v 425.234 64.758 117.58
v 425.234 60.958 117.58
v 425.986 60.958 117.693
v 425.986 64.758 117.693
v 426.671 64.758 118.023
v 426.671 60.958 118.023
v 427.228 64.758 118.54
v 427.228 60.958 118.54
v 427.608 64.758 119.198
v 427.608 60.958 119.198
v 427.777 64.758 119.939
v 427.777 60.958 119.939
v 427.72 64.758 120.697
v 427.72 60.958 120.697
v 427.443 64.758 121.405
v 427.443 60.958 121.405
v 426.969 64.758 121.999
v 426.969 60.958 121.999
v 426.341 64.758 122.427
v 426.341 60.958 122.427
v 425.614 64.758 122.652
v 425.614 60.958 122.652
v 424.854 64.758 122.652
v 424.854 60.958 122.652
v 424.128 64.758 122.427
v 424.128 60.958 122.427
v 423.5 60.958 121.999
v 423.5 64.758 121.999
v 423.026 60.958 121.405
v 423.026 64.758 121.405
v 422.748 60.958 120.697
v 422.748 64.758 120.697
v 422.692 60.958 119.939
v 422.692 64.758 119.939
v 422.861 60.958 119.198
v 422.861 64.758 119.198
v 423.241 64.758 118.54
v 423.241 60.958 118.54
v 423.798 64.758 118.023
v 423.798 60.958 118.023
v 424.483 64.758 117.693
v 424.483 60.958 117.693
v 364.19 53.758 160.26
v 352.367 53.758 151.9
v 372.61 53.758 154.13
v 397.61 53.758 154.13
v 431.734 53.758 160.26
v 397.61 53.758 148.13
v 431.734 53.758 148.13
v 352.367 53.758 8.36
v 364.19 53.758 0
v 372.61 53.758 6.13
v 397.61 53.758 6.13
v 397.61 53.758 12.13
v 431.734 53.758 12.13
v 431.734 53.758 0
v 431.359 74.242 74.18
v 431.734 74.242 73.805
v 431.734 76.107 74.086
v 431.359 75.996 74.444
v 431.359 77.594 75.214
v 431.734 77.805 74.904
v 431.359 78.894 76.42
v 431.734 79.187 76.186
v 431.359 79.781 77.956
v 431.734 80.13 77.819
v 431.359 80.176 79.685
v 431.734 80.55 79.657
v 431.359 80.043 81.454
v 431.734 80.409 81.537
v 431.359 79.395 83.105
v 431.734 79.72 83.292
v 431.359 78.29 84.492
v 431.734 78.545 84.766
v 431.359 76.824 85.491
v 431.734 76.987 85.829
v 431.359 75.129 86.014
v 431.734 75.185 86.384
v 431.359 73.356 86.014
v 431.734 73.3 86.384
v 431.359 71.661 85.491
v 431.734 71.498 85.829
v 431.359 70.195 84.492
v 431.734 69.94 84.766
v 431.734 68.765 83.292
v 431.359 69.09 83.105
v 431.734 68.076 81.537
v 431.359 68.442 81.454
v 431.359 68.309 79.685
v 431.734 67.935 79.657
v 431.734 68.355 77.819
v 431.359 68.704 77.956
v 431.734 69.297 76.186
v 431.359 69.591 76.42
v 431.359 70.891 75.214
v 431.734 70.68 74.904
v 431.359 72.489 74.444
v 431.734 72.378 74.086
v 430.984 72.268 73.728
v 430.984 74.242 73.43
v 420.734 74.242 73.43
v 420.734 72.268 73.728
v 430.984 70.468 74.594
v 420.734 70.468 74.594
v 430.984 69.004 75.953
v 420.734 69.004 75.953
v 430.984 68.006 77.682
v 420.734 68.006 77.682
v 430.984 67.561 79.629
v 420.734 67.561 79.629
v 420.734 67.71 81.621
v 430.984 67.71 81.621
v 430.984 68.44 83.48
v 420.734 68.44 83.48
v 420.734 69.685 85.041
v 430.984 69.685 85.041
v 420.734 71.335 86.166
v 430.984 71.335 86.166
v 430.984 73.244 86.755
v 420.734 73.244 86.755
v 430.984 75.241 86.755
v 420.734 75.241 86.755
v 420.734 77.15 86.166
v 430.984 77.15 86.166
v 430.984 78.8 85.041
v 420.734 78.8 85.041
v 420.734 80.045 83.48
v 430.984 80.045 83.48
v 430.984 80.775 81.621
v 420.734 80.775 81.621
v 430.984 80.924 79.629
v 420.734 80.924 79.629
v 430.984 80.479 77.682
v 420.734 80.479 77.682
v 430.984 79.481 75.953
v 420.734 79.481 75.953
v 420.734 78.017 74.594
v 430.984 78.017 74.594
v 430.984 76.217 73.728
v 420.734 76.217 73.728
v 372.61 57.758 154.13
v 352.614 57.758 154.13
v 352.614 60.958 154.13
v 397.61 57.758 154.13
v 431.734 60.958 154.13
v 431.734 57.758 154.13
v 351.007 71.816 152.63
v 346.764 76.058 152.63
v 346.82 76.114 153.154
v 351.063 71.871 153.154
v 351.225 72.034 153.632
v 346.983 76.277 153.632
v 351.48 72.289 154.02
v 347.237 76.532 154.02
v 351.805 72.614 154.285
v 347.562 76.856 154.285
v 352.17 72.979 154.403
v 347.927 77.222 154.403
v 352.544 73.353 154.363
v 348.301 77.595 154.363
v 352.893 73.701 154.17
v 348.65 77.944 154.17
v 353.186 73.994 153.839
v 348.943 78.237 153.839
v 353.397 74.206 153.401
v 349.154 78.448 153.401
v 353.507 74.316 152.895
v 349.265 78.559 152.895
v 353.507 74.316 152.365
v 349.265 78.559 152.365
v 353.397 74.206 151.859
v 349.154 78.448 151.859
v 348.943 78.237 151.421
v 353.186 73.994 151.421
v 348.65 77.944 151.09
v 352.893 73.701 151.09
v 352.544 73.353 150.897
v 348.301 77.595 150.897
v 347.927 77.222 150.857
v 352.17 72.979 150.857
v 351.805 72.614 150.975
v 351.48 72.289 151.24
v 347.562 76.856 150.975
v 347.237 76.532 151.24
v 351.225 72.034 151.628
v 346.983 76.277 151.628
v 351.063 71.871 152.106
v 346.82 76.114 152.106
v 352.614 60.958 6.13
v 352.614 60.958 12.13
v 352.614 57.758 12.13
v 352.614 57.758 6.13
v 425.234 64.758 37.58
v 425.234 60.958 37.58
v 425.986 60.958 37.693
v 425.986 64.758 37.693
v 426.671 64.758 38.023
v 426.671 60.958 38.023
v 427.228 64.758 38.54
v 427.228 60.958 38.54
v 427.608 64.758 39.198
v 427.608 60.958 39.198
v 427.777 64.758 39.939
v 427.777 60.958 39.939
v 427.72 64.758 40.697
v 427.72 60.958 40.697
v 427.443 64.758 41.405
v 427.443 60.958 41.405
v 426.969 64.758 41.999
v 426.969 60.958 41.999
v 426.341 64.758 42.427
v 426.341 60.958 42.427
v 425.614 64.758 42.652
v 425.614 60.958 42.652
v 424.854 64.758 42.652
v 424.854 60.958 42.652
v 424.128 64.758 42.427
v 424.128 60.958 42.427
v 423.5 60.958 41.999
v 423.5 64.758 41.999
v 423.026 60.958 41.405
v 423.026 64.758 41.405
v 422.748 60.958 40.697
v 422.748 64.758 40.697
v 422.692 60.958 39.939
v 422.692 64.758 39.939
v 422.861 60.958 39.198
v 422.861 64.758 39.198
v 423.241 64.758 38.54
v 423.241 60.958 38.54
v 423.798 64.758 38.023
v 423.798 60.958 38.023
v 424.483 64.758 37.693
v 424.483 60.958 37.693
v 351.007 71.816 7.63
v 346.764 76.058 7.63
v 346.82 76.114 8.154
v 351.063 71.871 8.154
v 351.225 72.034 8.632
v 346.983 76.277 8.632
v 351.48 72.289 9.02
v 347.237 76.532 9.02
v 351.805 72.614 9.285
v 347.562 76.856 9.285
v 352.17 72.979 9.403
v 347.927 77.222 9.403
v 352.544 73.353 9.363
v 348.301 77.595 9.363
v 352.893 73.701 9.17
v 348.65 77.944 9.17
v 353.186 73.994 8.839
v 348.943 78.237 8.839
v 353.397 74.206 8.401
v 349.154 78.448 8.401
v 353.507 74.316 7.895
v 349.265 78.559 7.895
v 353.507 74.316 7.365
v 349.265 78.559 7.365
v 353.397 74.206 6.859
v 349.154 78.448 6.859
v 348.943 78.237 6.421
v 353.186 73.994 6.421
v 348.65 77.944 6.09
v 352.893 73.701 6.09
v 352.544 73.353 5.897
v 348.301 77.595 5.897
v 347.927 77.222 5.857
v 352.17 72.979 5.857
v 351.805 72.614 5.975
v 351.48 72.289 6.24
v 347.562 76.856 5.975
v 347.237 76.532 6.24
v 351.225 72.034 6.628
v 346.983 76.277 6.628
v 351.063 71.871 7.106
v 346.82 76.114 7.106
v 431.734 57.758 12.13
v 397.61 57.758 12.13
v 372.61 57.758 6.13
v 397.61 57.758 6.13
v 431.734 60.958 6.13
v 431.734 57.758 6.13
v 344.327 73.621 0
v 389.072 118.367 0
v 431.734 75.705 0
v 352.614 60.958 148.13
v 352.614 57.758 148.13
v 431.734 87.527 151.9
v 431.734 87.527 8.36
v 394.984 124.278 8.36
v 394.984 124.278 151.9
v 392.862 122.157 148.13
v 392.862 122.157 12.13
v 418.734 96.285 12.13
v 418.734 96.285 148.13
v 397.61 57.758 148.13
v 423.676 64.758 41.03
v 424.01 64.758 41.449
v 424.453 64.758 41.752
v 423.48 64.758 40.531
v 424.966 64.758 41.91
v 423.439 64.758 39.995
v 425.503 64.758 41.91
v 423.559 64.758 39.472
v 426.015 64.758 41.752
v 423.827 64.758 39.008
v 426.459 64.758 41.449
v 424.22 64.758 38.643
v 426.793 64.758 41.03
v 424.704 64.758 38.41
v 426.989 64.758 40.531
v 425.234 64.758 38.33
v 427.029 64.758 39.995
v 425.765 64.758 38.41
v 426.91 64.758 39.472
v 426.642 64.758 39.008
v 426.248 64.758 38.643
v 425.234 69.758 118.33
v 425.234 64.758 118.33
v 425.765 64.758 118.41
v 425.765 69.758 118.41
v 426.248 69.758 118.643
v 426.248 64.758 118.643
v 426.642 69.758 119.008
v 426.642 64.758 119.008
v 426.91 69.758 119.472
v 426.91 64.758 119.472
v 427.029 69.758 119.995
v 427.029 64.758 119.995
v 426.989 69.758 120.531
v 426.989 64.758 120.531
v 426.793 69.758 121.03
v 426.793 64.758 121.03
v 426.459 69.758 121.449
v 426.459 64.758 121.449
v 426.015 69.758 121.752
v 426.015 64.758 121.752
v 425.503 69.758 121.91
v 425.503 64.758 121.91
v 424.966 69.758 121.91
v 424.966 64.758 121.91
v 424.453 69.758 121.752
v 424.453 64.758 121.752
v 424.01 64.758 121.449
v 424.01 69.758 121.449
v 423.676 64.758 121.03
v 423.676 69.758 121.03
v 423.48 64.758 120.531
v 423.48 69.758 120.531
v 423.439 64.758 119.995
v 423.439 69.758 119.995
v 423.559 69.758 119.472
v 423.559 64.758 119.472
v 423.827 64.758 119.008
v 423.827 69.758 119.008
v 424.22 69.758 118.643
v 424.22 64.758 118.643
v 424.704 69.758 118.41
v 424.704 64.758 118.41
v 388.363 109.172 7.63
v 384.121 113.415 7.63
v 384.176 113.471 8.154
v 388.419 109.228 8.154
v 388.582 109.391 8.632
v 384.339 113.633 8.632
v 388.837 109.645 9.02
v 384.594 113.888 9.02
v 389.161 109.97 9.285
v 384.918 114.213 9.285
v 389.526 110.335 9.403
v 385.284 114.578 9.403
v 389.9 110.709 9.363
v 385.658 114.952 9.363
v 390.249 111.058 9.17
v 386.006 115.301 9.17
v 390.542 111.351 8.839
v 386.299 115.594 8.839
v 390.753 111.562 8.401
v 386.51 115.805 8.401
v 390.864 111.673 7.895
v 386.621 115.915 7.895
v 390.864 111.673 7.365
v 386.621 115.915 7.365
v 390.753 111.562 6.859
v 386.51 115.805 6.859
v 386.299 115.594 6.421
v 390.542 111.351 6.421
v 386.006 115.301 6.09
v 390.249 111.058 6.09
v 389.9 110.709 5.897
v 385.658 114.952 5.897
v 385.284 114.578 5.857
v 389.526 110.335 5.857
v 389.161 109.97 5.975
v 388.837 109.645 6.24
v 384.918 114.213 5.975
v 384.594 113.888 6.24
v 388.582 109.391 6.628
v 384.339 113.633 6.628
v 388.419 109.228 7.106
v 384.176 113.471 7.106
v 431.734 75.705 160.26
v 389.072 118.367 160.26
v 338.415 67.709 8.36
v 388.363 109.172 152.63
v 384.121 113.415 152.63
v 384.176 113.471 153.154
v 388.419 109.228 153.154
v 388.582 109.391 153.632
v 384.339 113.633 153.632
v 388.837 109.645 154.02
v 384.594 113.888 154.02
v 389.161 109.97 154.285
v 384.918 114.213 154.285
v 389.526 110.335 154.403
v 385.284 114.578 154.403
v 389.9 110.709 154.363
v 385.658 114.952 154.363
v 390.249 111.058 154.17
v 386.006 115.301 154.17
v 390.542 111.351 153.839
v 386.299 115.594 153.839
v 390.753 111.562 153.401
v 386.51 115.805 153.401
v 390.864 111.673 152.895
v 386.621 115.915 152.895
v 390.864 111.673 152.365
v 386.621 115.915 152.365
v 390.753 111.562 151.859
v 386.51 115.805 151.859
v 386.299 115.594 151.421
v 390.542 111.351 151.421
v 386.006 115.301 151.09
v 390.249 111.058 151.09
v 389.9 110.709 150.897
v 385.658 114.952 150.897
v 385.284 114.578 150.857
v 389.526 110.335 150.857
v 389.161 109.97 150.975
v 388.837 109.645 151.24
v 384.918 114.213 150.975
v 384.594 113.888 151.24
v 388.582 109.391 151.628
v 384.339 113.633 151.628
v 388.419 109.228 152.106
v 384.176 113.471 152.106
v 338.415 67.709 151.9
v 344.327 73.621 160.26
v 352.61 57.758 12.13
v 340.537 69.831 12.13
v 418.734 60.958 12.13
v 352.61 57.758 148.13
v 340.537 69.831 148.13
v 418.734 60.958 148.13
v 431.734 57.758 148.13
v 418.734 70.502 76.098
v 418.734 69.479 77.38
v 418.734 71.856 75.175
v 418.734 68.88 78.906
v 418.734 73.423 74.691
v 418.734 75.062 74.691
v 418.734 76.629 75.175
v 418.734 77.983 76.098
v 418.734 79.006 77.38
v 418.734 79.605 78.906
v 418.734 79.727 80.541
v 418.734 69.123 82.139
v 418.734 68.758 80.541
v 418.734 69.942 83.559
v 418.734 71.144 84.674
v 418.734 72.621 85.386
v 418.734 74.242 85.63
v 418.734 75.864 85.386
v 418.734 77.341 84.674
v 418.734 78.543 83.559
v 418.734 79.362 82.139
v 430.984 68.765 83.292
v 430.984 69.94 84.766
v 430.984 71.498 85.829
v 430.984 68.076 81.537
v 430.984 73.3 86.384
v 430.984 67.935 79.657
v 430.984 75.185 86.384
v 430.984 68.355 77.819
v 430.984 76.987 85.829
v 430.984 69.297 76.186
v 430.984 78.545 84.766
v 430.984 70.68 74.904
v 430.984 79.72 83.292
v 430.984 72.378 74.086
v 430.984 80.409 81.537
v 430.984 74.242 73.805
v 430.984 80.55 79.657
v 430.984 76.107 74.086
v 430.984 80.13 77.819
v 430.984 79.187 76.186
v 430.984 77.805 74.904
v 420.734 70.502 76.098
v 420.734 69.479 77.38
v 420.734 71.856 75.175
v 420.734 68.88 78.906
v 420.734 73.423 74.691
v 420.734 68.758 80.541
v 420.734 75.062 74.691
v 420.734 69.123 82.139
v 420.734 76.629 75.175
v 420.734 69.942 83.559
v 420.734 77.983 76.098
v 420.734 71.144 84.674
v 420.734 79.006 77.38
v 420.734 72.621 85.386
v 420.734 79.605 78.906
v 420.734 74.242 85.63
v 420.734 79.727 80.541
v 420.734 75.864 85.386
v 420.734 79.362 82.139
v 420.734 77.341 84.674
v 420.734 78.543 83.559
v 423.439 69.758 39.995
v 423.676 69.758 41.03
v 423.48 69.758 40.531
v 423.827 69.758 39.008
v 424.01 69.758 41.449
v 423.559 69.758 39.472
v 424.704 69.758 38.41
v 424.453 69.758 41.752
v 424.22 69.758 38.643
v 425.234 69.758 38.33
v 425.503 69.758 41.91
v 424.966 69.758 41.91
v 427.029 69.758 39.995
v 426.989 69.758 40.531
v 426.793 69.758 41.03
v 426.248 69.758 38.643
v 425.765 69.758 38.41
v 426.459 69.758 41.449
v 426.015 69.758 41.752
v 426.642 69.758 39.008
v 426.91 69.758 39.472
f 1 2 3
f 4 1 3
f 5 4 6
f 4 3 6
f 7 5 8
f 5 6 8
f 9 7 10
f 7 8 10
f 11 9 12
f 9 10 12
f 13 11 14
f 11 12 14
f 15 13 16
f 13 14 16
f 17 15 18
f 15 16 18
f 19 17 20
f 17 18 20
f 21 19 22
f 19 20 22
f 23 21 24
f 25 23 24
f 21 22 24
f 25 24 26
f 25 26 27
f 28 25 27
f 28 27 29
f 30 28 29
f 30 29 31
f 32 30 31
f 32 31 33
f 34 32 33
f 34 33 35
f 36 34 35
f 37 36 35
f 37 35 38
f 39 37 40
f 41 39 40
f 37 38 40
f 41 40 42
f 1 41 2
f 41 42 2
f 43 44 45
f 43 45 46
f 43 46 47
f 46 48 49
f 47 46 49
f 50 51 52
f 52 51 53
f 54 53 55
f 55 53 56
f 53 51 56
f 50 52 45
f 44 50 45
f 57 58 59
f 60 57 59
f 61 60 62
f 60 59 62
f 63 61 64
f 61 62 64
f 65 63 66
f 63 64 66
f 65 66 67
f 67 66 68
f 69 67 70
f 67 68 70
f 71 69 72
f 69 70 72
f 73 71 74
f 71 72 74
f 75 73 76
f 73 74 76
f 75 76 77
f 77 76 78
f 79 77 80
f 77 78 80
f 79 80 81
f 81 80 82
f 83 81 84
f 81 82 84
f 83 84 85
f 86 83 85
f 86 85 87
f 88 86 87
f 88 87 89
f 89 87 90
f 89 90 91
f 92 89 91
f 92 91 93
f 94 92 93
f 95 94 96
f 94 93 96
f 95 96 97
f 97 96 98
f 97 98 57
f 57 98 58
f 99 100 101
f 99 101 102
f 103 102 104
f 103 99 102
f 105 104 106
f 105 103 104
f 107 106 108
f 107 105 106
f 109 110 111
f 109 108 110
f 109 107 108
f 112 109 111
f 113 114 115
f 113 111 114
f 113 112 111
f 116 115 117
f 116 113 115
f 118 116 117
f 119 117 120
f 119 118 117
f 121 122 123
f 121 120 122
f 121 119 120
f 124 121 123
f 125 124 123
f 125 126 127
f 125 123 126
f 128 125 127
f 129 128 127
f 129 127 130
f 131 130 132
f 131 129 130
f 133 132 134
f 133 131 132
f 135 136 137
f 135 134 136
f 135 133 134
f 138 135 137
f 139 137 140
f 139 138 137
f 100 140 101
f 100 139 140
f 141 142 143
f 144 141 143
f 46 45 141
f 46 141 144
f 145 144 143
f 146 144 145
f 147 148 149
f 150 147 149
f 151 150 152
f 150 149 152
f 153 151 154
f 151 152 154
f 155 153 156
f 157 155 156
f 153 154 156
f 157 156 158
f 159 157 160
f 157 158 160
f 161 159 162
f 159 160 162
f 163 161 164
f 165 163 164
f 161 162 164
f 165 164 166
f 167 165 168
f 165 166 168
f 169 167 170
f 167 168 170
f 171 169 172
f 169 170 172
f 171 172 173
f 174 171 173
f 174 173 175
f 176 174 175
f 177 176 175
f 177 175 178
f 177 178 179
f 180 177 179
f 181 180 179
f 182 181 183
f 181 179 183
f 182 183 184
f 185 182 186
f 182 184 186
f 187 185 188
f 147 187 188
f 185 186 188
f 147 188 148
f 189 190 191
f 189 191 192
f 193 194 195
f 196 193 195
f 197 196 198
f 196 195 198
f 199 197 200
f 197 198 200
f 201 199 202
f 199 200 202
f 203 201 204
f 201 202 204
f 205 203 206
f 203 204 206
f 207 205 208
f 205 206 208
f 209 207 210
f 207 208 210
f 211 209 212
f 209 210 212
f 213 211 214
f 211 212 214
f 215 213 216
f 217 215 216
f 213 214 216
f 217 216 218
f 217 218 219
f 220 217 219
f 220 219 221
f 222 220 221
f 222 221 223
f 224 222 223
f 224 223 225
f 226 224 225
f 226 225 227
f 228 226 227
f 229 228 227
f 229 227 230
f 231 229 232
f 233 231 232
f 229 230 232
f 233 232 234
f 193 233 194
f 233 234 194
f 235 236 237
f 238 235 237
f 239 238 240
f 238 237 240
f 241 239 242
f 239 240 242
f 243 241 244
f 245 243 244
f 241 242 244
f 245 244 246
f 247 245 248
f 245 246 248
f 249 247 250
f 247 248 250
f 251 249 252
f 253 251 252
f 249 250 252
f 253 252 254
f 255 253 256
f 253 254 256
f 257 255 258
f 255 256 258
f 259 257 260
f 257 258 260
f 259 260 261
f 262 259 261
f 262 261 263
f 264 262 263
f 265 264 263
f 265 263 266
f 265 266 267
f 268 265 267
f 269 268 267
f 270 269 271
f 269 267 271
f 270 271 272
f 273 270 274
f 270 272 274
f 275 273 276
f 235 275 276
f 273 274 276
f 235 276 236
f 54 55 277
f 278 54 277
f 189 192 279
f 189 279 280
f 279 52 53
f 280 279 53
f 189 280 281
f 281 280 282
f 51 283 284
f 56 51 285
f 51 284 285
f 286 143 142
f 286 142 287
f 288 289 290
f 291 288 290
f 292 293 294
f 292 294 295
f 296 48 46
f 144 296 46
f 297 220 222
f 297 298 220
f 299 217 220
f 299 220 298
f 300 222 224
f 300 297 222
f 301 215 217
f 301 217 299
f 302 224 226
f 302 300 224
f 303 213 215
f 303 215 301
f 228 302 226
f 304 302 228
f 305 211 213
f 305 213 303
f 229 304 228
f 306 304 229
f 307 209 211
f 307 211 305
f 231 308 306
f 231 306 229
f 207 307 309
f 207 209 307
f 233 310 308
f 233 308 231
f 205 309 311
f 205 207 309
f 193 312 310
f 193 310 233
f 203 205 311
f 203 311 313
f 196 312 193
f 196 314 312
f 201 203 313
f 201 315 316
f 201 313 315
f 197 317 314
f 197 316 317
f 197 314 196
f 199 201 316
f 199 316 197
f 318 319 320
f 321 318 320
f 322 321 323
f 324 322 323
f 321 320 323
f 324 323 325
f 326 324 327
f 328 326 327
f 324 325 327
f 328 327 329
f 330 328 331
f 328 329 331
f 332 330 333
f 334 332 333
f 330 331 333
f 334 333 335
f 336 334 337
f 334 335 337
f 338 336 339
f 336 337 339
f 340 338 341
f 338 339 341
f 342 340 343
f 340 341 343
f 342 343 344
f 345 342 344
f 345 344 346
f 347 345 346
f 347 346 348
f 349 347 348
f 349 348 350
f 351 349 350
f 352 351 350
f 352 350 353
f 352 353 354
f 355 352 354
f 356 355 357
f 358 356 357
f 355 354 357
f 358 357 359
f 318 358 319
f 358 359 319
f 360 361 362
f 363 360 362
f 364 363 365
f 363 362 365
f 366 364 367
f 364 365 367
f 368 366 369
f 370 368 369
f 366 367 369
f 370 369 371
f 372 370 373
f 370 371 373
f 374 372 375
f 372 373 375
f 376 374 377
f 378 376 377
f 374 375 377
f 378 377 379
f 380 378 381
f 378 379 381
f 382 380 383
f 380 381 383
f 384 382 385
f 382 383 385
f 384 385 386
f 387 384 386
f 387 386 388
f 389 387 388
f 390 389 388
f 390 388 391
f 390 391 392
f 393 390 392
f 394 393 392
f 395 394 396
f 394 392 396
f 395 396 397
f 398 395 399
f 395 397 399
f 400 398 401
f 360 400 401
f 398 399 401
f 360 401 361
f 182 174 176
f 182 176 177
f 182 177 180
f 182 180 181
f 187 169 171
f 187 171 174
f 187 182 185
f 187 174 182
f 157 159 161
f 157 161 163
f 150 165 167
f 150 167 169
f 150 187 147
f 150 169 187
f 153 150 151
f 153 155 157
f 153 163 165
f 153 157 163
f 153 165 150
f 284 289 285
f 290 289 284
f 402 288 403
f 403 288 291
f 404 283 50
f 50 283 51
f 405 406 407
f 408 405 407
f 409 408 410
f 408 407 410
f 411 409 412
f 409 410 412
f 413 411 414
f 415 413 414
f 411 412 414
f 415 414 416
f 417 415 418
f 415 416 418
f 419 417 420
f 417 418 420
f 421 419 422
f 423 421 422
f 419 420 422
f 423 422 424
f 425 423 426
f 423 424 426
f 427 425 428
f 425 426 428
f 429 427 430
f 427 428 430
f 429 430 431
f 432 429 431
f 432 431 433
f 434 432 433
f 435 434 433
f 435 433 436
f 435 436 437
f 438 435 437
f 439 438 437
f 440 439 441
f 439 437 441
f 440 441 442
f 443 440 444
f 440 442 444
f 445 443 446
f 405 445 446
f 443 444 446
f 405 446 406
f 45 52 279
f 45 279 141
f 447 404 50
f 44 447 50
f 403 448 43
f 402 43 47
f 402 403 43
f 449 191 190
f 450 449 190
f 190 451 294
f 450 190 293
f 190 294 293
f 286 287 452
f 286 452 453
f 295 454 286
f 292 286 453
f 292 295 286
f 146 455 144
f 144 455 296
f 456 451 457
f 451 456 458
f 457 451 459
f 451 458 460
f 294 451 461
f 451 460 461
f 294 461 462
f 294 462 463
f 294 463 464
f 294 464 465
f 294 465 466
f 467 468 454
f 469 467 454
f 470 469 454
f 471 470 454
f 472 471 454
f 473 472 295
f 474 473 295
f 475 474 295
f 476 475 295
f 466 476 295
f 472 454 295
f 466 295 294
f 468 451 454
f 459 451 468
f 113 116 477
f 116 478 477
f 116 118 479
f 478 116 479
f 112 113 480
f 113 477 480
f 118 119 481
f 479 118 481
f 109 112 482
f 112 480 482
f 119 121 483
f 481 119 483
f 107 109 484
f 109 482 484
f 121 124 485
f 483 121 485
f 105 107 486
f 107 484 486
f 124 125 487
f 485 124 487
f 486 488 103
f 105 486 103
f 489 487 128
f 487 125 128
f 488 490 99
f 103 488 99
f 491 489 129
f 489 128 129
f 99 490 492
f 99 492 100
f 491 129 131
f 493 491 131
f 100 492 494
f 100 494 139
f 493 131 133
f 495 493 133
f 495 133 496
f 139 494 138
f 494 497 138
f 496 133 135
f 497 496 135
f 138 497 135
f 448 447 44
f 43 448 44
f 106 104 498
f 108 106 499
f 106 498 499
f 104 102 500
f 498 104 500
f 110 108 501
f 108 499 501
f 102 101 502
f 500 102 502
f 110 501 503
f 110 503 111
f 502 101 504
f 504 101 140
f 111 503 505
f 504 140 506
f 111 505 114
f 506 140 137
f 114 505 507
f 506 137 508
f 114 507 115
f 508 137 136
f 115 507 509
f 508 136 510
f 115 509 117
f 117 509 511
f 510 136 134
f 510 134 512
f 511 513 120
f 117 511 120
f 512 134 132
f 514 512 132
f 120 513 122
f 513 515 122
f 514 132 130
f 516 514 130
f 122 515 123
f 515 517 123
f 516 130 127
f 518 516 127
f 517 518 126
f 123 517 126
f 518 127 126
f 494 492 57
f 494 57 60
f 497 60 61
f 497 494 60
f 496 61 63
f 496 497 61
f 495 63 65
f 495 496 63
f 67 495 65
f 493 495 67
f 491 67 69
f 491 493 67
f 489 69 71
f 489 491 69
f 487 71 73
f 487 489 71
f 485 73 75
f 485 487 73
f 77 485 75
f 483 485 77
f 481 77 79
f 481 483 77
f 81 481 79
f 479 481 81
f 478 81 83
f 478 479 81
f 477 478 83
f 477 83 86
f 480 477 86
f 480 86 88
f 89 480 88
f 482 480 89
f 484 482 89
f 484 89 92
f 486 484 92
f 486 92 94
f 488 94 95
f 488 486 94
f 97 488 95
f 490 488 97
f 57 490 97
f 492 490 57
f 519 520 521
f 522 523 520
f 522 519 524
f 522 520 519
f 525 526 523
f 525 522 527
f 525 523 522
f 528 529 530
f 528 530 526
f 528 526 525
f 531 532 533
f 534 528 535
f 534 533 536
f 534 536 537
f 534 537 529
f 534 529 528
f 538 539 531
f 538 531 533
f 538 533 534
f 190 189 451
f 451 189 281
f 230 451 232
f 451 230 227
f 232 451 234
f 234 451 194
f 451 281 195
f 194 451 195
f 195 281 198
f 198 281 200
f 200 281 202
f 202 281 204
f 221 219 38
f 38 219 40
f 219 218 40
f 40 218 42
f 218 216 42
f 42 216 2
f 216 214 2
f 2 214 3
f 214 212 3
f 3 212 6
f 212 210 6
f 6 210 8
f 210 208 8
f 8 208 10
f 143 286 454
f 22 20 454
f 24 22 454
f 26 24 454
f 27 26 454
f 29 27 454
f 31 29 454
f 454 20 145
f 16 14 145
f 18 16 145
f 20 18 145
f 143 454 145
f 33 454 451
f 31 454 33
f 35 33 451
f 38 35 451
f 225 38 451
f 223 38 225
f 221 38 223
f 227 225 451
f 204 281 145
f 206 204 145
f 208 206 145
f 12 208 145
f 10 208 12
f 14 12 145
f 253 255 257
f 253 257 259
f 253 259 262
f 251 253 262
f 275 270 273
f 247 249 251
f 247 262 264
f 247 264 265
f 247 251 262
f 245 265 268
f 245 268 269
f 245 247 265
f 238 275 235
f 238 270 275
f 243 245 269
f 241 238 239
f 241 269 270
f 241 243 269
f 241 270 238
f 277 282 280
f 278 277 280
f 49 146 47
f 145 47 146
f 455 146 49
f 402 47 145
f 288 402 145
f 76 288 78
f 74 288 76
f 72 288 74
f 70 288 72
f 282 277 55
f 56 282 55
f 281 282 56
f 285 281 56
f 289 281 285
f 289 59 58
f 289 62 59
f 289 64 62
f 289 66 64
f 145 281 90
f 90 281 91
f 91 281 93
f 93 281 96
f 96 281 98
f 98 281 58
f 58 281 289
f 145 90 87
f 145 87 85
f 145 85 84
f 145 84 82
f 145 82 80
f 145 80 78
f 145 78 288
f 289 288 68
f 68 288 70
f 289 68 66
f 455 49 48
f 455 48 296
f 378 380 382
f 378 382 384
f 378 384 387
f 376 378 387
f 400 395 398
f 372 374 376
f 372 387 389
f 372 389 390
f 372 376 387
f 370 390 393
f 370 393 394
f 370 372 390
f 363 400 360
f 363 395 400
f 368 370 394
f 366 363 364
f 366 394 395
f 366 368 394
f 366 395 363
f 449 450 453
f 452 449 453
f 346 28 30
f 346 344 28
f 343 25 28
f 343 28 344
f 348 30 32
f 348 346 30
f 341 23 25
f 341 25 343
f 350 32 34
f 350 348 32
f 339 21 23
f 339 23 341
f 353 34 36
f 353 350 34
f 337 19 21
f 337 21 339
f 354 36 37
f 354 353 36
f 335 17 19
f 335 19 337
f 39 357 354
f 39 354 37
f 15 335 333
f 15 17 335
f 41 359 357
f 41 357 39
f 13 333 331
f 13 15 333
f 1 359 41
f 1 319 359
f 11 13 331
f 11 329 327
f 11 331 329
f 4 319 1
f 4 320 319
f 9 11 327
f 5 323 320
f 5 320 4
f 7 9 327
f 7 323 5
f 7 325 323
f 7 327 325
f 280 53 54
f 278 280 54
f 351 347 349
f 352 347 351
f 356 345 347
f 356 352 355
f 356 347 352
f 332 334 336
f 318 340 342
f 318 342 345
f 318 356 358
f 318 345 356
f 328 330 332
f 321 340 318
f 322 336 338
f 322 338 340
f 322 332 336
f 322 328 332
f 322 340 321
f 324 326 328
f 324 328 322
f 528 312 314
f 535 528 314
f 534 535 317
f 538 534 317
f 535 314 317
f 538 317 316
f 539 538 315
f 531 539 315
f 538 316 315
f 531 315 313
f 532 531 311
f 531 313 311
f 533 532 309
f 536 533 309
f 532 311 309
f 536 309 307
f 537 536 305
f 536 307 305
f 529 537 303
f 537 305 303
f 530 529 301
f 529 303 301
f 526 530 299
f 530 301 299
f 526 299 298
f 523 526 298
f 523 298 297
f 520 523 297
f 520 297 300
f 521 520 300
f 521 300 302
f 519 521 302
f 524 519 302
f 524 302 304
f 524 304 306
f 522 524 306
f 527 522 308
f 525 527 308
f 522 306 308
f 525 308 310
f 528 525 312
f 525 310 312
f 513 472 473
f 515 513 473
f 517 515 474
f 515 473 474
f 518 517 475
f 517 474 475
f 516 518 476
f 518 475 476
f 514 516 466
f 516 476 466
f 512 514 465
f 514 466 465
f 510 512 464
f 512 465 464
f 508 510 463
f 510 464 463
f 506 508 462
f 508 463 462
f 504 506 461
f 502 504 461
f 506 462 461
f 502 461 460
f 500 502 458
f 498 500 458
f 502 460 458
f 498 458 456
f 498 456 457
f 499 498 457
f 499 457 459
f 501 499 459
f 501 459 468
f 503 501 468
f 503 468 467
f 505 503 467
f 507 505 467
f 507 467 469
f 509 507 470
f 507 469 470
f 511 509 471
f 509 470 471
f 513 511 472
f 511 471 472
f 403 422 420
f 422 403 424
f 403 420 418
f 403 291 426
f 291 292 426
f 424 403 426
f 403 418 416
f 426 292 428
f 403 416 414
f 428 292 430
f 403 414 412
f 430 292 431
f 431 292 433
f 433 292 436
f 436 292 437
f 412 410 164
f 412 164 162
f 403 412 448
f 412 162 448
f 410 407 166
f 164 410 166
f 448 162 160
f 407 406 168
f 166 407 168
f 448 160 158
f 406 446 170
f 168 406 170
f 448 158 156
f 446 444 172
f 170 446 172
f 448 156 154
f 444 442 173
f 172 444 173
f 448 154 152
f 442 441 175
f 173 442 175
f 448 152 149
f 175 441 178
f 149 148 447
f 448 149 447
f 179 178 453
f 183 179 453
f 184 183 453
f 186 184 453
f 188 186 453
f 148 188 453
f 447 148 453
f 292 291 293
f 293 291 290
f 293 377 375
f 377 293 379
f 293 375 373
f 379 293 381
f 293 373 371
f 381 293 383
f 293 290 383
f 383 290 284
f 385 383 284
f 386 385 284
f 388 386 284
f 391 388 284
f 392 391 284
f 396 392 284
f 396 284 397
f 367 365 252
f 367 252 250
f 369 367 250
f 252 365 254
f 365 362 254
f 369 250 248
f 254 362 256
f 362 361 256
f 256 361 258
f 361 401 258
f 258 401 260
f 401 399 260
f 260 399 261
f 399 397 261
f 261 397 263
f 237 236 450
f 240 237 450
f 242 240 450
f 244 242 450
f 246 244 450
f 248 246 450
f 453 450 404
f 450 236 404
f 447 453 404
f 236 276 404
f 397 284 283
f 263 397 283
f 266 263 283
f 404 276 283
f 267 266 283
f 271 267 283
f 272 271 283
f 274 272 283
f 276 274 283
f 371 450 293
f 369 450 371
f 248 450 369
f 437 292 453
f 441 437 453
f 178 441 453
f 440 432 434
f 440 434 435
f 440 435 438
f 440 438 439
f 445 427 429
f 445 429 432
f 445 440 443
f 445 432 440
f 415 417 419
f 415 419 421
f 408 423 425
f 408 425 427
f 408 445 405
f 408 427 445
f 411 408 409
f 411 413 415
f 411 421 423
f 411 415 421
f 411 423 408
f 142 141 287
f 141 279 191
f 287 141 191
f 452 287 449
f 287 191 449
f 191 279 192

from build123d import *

# Parameters (mm, degrees)
BOSS_EXTRUDE1_DEPTH  = 160.26
SKETCH2_OUTSIDE_W    = 201.942
SKETCH2_OUTSIDE_H    = 157.534
SKETCH2_OUTSIDE_W_2  = 160.26
SKETCH2_OUTSIDE_H_2  = 80
SKETCH2_OUTSIDE_W_3  = 136
SKETCH2_OUTSIDE_H_3  = 74
CUT_EXTRUDE1_DEPTH   = 156
SKETCH11_R           = 1.778
CUT_EXTRUDE8_DEPTH   = 6
BOSS_EXTRUDE14_REACH = 475.056
SKETCH19_W           = 148
SKETCH19_H           = 3.2
CUT_EXTRUDE13_DEPTH  = 79.12
SKETCH24_W           = 136
SKETCH24_H           = 4
CUT_EXTRUDE15_DEPTH  = 3
BOSS_EXTRUDE16_REACH = 475.056
CHAMFER2_SIZE        = 8.36
CUT_EXTRUDE19_REACH  = 467.887
SKETCH31_W           = 25
SKETCH31_H           = 6
SKETCH32_R           = 6.7
CUT_EXTRUDE20_DEPTH  = 10
SKETCH33_R           = 9.2
SKETCH33_R_2         = 6.7
BOSS_EXTRUDE17_DEPTH = 10
SKETCH34_R           = 9
SKETCH34_R_2         = 5.5
BOSS_EXTRUDE18_DEPTH = 2
SKETCH35_R           = 6.7
SKETCH35_R_2         = 5.95
BOSS_EXTRUDE19_DEPTH = 0.75
CHAMFER4_SIZE        = 0.375
SKETCH36_W           = 136
SKETCH36_H           = 25.327231326
SKETCH36_R           = 9.2
BOSS_EXTRUDE20_DEPTH = 10
BOSS_EXTRUDE21_DEPTH = 136
SKETCH38_R           = 2.55
CUT_EXTRUDE23_DEPTH  = 3.8
SKETCH39_R           = 1.8
CUT_EXTRUDE24_DEPTH  = 5


with BuildPart() as part:
    # Sketch1 → Boss-Extrude1 (new body)
    with BuildSketch(Plane.XY):
        Polygon((352.367164448, 53.75754858), (431.734377425, 53.75754858), (431.734377425, 87.527420593), (394.983805142, 124.277992876), (338.415262647, 67.709450381), align=None)
    extrude(amount=BOSS_EXTRUDE1_DEPTH)

    # Sketch2 outside → Cut-Extrude1 (cut)
    # profile 1 of 2: a face of its own
    with BuildSketch(Plane(origin=(135.352906133, -135.352906133, 0), x_dir=(0, 0, 1), z_dir=(-0.7071067811865476, 0.7071067811865476, 0))):
        with Locations((80.13, 335.234)):
            Rectangle(SKETCH2_OUTSIDE_W, SKETCH2_OUTSIDE_H)
        with Locations((80.13, 327.17353859)):
            Rectangle(SKETCH2_OUTSIDE_W_2, SKETCH2_OUTSIDE_H_2, mode=Mode.SUBTRACT)
    # profile 2 of 2: a face of its own
    with BuildSketch(Plane(origin=(135.352906133, -135.352906133, 0), x_dir=(0, 0, 1), z_dir=(-0.7071067811865476, 0.7071067811865476, 0))):
        with Locations((80.13, 327.17353859)):
            Rectangle(SKETCH2_OUTSIDE_W_3, SKETCH2_OUTSIDE_H_3)
    extrude(amount=-CUT_EXTRUDE1_DEPTH, mode=Mode.SUBTRACT)

    # Sketch11 → Cut-Extrude8 (cut)
    with BuildSketch(Plane(origin=(135.352906133, -135.352906133, 0), x_dir=(0, 0, 1), z_dir=(-0.7071067811865476, 0.7071067811865476, 0))):
        with Locations(Location((7.63, 353.58853859, 0), (0, 0, 270))):
            Circle(SKETCH11_R)
        with Locations(Location((7.63, 300.75853859, 0), (0, 0, 270))):
            Circle(SKETCH11_R)
        with Locations(Location((152.63, 353.58853859, 0), (0, 0, 270))):
            Circle(SKETCH11_R)
        with Locations(Location((152.63, 300.75853859, 0), (0, 0, 270))):
            Circle(SKETCH11_R)
    extrude(amount=-CUT_EXTRUDE8_DEPTH, mode=Mode.SUBTRACT)

    # Sketch17 → Boss-Extrude14 (add, up to next)
    with BuildSketch(Plane.XY.offset(12.13), mode=Mode.PRIVATE) as boss_extrude14_sk1:
        Polygon((431.734377425, 83.284779906), (431.734377425, 53.75754858), (428.734377425, 53.75754858), (428.734377425, 86.284779906), align=None)
    boss_extrude14_tool1 = extrude(boss_extrude14_sk1.sketch, amount=BOSS_EXTRUDE14_REACH, mode=Mode.PRIVATE) - part.part
    add(boss_extrude14_tool1.solids().sort_by_distance((430.210205, 69.28325, 12.13))[0])

    # Sketch19 → Cut-Extrude13 (cut)
    with BuildSketch(Plane(origin=(431.734377425, 0, 0), x_dir=(0, 0, -1), z_dir=(1, 0, 0))):
        with Locations((-80.13, 59.35754858)):
            Rectangle(SKETCH19_W, SKETCH19_H)
    extrude(amount=-CUT_EXTRUDE13_DEPTH, mode=Mode.SUBTRACT)

    # Sketch24 → Cut-Extrude15 (cut)
    with BuildSketch(Plane(origin=(431.734377425, 0, 0), x_dir=(0, 0, -1), z_dir=(1, 0, 0))):
        with Locations((-80.13, 55.75754858)):
            Rectangle(SKETCH24_W, SKETCH24_H)
    extrude(amount=-CUT_EXTRUDE15_DEPTH, mode=Mode.SUBTRACT)

    # Sketch29 → Boss-Extrude16 (add, up to next)
    with BuildSketch(Plane.XY.offset(12.13), mode=Mode.PRIVATE) as boss_extrude16_sk1:
        Polygon((356.609805135, 53.75754858), (372.609805135, 53.75754858), (372.609805135, 57.75754858), (352.609805135, 57.75754858), align=None)
    boss_extrude16_tool1 = extrude(boss_extrude16_sk1.sketch, amount=BOSS_EXTRUDE16_REACH, mode=Mode.PRIVATE) - part.part
    add(boss_extrude16_tool1.solids().sort_by_distance((363.572768, 55.831623, 12.13))[0])

    # Chamfer2
    chamfer2_edges = [part.edges().sort_by_distance(p)[0] for p in [
        (413.359091284, 105.902706735, 160.26),
        (345.391213548, 60.733499481, 160.26),
        (345.391213548, 60.733499481, 0),
        (413.359091284, 105.902706735, 0),
    ]]
    chamfer(chamfer2_edges, length=CHAMFER2_SIZE)

    # Sketch31 → Cut-Extrude19 (cut, up to next)
    with BuildSketch(Plane.XZ.offset(-53.75754858), mode=Mode.PRIVATE) as cut_extrude19_sk1:
        with Locations((385.109805135, 151.13)):
            Rectangle(SKETCH31_W, SKETCH31_H)
    cut_extrude19_tool1 = extrude(cut_extrude19_sk1.sketch, amount=-CUT_EXTRUDE19_REACH, mode=Mode.PRIVATE) & part.part
    # Sketch31 → Cut-Extrude19 (cut, up to next)
    with BuildSketch(Plane.XZ.offset(-53.75754858), mode=Mode.PRIVATE) as cut_extrude19_sk2:
        with Locations((385.109805135, 9.13)):
            Rectangle(SKETCH31_W, SKETCH31_H)
    cut_extrude19_tool2 = extrude(cut_extrude19_sk2.sketch, amount=-CUT_EXTRUDE19_REACH, mode=Mode.PRIVATE) & part.part
    add(cut_extrude19_tool1.solids().sort_by_distance((385.109805, 53.757549, 151.13))[0], mode=Mode.SUBTRACT)
    add(cut_extrude19_tool2.solids().sort_by_distance((385.109805, 53.757549, 9.13))[0], mode=Mode.SUBTRACT)

    # Sketch32 → Cut-Extrude20 (cut)
    with BuildSketch(Plane(origin=(431.734377425, 0, 0), x_dir=(0, 0, -1), z_dir=(1, 0, 0))):
        with Locations((-80.13, 74.242484587)):
            Circle(SKETCH32_R)
    extrude(amount=-CUT_EXTRUDE20_DEPTH, mode=Mode.SUBTRACT)

    # Sketch33 → Boss-Extrude17 (add)
    with BuildSketch(Plane.ZY.offset(-428.734377425)):
        with Locations(Location((80.13, 74.242484587, 0), (0, 0, 180))):
            Circle(SKETCH33_R)
        with Locations(Location((80.13, 74.242484587, 0), (0, 0, 180))):
            Circle(SKETCH33_R_2, mode=Mode.SUBTRACT)
    extrude(amount=BOSS_EXTRUDE17_DEPTH)

    # Sketch34 → Boss-Extrude18 (add)
    with BuildSketch(Plane.ZY.offset(-418.734377425)):
        with Locations((80.13, 74.242484587)):
            Circle(SKETCH34_R)
        with Locations((80.13, 74.242484587)):
            Circle(SKETCH34_R_2, mode=Mode.SUBTRACT)
    extrude(amount=-BOSS_EXTRUDE18_DEPTH)

    # Sketch35 → Boss-Extrude19 (add)
    with BuildSketch(Plane(origin=(431.734377425, 0, 0), x_dir=(0, 0, -1), z_dir=(1, 0, 0))):
        with Locations((-80.13, 74.242484587)):
            Circle(SKETCH35_R)
        with Locations((-80.13, 74.242484587)):
            Circle(SKETCH35_R_2, mode=Mode.SUBTRACT)
    extrude(amount=-BOSS_EXTRUDE19_DEPTH)

    # Chamfer4
    chamfer4_edges = [part.edges().sort_by_distance(p)[0] for p in [
        (430.984377425, 74.242484587, 86.08),
        (431.734377425, 74.242484587, 86.08),
    ]]
    chamfer(chamfer4_edges, length=CHAMFER4_SIZE - 0.0001)  # a hair under: the kernel refuses the full size

    # Sketch36 → Boss-Extrude20 (add)
    with BuildSketch(Plane.ZY.offset(-428.734377425)):
        with Locations((80.13, 73.621164243)):
            Rectangle(SKETCH36_W, SKETCH36_H)
        with Locations((80.13, 74.242484587)):
            Circle(SKETCH36_R, mode=Mode.SUBTRACT)
    extrude(amount=BOSS_EXTRUDE20_DEPTH)

    # Sketch37 → Boss-Extrude21 (add)
    with BuildSketch(Plane(origin=(0, 0, 148.13), x_dir=(-1, 0, 0), z_dir=(0, 0, -1))):
        Polygon((-418.734377425, 86.284779906), (-418.734377425, 96.284779906), (-428.734377425, 86.284779906), align=None)
    extrude(amount=BOSS_EXTRUDE21_DEPTH)

    # Sketch38 → Cut-Extrude23 (cut)
    with BuildSketch(Plane.XZ.offset(-60.95754858)):
        with Locations(Location((425.234377425, 120.13, 0), (0, 0, 270))):
            Circle(SKETCH38_R)
        with Locations(Location((425.234377425, 40.13, 0), (0, 0, 270))):
            Circle(SKETCH38_R)
    extrude(amount=-CUT_EXTRUDE23_DEPTH, mode=Mode.SUBTRACT)

    # Sketch39 → Cut-Extrude24 (cut)
    with BuildSketch(Plane.XZ.offset(-64.75754858)):
        with Locations(Location((425.234377425, 120.13, 0), (0, 0, 270))):
            Circle(SKETCH39_R)
        with Locations(Location((425.234377425, 40.13, 0), (0, 0, 270))):
            Circle(SKETCH39_R)
    extrude(amount=-CUT_EXTRUDE24_DEPTH, mode=Mode.SUBTRACT)


solid = part.part
